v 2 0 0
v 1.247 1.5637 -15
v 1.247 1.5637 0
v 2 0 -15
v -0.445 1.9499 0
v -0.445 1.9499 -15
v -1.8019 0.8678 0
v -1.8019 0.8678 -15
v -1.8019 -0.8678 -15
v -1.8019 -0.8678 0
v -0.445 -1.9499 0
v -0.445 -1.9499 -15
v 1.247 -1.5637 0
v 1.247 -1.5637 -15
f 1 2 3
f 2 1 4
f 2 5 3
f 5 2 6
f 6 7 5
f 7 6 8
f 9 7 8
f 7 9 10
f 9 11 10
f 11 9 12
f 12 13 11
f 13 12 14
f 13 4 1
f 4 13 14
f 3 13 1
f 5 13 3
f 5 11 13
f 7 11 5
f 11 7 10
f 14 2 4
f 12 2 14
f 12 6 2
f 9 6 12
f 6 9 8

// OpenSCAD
default_pitch_lookup_table = [
    // M  P
    [0, undef], [1, 0.25],
    [2, 0.4], [3, 0.5],
    [4, 0.7], [5, 0.8],
    [6, 1.0], [7, 1.0],
    [8, 1.25], [9, undef],
    [10, 1.5], [11, undef],
    [12, 1.75], [13, undef],
    [14, 2.0], [15, undef],
    [16, 2.0], [17, undef],
    [18, 2.5], [19, undef],
    [20, 2.5],
];

/*
pitch can be actual pitch in mm,
or undef for default value
*/

module metric_bolt(
    nominal_diameter, pitch = undef, length,
    generate_thread = true
) {
    pitch = pitch ? pitch
        : default_pitch_lookup_table[nominal_diameter][1];
    mirror([0, 0, 1])
    if(generate_thread) {
        
    } else {
        cylinder(length, nominal_diameter, nominal_diameter);
    }
}

// M2x15
metric_bolt(2, undef, 15, false);
